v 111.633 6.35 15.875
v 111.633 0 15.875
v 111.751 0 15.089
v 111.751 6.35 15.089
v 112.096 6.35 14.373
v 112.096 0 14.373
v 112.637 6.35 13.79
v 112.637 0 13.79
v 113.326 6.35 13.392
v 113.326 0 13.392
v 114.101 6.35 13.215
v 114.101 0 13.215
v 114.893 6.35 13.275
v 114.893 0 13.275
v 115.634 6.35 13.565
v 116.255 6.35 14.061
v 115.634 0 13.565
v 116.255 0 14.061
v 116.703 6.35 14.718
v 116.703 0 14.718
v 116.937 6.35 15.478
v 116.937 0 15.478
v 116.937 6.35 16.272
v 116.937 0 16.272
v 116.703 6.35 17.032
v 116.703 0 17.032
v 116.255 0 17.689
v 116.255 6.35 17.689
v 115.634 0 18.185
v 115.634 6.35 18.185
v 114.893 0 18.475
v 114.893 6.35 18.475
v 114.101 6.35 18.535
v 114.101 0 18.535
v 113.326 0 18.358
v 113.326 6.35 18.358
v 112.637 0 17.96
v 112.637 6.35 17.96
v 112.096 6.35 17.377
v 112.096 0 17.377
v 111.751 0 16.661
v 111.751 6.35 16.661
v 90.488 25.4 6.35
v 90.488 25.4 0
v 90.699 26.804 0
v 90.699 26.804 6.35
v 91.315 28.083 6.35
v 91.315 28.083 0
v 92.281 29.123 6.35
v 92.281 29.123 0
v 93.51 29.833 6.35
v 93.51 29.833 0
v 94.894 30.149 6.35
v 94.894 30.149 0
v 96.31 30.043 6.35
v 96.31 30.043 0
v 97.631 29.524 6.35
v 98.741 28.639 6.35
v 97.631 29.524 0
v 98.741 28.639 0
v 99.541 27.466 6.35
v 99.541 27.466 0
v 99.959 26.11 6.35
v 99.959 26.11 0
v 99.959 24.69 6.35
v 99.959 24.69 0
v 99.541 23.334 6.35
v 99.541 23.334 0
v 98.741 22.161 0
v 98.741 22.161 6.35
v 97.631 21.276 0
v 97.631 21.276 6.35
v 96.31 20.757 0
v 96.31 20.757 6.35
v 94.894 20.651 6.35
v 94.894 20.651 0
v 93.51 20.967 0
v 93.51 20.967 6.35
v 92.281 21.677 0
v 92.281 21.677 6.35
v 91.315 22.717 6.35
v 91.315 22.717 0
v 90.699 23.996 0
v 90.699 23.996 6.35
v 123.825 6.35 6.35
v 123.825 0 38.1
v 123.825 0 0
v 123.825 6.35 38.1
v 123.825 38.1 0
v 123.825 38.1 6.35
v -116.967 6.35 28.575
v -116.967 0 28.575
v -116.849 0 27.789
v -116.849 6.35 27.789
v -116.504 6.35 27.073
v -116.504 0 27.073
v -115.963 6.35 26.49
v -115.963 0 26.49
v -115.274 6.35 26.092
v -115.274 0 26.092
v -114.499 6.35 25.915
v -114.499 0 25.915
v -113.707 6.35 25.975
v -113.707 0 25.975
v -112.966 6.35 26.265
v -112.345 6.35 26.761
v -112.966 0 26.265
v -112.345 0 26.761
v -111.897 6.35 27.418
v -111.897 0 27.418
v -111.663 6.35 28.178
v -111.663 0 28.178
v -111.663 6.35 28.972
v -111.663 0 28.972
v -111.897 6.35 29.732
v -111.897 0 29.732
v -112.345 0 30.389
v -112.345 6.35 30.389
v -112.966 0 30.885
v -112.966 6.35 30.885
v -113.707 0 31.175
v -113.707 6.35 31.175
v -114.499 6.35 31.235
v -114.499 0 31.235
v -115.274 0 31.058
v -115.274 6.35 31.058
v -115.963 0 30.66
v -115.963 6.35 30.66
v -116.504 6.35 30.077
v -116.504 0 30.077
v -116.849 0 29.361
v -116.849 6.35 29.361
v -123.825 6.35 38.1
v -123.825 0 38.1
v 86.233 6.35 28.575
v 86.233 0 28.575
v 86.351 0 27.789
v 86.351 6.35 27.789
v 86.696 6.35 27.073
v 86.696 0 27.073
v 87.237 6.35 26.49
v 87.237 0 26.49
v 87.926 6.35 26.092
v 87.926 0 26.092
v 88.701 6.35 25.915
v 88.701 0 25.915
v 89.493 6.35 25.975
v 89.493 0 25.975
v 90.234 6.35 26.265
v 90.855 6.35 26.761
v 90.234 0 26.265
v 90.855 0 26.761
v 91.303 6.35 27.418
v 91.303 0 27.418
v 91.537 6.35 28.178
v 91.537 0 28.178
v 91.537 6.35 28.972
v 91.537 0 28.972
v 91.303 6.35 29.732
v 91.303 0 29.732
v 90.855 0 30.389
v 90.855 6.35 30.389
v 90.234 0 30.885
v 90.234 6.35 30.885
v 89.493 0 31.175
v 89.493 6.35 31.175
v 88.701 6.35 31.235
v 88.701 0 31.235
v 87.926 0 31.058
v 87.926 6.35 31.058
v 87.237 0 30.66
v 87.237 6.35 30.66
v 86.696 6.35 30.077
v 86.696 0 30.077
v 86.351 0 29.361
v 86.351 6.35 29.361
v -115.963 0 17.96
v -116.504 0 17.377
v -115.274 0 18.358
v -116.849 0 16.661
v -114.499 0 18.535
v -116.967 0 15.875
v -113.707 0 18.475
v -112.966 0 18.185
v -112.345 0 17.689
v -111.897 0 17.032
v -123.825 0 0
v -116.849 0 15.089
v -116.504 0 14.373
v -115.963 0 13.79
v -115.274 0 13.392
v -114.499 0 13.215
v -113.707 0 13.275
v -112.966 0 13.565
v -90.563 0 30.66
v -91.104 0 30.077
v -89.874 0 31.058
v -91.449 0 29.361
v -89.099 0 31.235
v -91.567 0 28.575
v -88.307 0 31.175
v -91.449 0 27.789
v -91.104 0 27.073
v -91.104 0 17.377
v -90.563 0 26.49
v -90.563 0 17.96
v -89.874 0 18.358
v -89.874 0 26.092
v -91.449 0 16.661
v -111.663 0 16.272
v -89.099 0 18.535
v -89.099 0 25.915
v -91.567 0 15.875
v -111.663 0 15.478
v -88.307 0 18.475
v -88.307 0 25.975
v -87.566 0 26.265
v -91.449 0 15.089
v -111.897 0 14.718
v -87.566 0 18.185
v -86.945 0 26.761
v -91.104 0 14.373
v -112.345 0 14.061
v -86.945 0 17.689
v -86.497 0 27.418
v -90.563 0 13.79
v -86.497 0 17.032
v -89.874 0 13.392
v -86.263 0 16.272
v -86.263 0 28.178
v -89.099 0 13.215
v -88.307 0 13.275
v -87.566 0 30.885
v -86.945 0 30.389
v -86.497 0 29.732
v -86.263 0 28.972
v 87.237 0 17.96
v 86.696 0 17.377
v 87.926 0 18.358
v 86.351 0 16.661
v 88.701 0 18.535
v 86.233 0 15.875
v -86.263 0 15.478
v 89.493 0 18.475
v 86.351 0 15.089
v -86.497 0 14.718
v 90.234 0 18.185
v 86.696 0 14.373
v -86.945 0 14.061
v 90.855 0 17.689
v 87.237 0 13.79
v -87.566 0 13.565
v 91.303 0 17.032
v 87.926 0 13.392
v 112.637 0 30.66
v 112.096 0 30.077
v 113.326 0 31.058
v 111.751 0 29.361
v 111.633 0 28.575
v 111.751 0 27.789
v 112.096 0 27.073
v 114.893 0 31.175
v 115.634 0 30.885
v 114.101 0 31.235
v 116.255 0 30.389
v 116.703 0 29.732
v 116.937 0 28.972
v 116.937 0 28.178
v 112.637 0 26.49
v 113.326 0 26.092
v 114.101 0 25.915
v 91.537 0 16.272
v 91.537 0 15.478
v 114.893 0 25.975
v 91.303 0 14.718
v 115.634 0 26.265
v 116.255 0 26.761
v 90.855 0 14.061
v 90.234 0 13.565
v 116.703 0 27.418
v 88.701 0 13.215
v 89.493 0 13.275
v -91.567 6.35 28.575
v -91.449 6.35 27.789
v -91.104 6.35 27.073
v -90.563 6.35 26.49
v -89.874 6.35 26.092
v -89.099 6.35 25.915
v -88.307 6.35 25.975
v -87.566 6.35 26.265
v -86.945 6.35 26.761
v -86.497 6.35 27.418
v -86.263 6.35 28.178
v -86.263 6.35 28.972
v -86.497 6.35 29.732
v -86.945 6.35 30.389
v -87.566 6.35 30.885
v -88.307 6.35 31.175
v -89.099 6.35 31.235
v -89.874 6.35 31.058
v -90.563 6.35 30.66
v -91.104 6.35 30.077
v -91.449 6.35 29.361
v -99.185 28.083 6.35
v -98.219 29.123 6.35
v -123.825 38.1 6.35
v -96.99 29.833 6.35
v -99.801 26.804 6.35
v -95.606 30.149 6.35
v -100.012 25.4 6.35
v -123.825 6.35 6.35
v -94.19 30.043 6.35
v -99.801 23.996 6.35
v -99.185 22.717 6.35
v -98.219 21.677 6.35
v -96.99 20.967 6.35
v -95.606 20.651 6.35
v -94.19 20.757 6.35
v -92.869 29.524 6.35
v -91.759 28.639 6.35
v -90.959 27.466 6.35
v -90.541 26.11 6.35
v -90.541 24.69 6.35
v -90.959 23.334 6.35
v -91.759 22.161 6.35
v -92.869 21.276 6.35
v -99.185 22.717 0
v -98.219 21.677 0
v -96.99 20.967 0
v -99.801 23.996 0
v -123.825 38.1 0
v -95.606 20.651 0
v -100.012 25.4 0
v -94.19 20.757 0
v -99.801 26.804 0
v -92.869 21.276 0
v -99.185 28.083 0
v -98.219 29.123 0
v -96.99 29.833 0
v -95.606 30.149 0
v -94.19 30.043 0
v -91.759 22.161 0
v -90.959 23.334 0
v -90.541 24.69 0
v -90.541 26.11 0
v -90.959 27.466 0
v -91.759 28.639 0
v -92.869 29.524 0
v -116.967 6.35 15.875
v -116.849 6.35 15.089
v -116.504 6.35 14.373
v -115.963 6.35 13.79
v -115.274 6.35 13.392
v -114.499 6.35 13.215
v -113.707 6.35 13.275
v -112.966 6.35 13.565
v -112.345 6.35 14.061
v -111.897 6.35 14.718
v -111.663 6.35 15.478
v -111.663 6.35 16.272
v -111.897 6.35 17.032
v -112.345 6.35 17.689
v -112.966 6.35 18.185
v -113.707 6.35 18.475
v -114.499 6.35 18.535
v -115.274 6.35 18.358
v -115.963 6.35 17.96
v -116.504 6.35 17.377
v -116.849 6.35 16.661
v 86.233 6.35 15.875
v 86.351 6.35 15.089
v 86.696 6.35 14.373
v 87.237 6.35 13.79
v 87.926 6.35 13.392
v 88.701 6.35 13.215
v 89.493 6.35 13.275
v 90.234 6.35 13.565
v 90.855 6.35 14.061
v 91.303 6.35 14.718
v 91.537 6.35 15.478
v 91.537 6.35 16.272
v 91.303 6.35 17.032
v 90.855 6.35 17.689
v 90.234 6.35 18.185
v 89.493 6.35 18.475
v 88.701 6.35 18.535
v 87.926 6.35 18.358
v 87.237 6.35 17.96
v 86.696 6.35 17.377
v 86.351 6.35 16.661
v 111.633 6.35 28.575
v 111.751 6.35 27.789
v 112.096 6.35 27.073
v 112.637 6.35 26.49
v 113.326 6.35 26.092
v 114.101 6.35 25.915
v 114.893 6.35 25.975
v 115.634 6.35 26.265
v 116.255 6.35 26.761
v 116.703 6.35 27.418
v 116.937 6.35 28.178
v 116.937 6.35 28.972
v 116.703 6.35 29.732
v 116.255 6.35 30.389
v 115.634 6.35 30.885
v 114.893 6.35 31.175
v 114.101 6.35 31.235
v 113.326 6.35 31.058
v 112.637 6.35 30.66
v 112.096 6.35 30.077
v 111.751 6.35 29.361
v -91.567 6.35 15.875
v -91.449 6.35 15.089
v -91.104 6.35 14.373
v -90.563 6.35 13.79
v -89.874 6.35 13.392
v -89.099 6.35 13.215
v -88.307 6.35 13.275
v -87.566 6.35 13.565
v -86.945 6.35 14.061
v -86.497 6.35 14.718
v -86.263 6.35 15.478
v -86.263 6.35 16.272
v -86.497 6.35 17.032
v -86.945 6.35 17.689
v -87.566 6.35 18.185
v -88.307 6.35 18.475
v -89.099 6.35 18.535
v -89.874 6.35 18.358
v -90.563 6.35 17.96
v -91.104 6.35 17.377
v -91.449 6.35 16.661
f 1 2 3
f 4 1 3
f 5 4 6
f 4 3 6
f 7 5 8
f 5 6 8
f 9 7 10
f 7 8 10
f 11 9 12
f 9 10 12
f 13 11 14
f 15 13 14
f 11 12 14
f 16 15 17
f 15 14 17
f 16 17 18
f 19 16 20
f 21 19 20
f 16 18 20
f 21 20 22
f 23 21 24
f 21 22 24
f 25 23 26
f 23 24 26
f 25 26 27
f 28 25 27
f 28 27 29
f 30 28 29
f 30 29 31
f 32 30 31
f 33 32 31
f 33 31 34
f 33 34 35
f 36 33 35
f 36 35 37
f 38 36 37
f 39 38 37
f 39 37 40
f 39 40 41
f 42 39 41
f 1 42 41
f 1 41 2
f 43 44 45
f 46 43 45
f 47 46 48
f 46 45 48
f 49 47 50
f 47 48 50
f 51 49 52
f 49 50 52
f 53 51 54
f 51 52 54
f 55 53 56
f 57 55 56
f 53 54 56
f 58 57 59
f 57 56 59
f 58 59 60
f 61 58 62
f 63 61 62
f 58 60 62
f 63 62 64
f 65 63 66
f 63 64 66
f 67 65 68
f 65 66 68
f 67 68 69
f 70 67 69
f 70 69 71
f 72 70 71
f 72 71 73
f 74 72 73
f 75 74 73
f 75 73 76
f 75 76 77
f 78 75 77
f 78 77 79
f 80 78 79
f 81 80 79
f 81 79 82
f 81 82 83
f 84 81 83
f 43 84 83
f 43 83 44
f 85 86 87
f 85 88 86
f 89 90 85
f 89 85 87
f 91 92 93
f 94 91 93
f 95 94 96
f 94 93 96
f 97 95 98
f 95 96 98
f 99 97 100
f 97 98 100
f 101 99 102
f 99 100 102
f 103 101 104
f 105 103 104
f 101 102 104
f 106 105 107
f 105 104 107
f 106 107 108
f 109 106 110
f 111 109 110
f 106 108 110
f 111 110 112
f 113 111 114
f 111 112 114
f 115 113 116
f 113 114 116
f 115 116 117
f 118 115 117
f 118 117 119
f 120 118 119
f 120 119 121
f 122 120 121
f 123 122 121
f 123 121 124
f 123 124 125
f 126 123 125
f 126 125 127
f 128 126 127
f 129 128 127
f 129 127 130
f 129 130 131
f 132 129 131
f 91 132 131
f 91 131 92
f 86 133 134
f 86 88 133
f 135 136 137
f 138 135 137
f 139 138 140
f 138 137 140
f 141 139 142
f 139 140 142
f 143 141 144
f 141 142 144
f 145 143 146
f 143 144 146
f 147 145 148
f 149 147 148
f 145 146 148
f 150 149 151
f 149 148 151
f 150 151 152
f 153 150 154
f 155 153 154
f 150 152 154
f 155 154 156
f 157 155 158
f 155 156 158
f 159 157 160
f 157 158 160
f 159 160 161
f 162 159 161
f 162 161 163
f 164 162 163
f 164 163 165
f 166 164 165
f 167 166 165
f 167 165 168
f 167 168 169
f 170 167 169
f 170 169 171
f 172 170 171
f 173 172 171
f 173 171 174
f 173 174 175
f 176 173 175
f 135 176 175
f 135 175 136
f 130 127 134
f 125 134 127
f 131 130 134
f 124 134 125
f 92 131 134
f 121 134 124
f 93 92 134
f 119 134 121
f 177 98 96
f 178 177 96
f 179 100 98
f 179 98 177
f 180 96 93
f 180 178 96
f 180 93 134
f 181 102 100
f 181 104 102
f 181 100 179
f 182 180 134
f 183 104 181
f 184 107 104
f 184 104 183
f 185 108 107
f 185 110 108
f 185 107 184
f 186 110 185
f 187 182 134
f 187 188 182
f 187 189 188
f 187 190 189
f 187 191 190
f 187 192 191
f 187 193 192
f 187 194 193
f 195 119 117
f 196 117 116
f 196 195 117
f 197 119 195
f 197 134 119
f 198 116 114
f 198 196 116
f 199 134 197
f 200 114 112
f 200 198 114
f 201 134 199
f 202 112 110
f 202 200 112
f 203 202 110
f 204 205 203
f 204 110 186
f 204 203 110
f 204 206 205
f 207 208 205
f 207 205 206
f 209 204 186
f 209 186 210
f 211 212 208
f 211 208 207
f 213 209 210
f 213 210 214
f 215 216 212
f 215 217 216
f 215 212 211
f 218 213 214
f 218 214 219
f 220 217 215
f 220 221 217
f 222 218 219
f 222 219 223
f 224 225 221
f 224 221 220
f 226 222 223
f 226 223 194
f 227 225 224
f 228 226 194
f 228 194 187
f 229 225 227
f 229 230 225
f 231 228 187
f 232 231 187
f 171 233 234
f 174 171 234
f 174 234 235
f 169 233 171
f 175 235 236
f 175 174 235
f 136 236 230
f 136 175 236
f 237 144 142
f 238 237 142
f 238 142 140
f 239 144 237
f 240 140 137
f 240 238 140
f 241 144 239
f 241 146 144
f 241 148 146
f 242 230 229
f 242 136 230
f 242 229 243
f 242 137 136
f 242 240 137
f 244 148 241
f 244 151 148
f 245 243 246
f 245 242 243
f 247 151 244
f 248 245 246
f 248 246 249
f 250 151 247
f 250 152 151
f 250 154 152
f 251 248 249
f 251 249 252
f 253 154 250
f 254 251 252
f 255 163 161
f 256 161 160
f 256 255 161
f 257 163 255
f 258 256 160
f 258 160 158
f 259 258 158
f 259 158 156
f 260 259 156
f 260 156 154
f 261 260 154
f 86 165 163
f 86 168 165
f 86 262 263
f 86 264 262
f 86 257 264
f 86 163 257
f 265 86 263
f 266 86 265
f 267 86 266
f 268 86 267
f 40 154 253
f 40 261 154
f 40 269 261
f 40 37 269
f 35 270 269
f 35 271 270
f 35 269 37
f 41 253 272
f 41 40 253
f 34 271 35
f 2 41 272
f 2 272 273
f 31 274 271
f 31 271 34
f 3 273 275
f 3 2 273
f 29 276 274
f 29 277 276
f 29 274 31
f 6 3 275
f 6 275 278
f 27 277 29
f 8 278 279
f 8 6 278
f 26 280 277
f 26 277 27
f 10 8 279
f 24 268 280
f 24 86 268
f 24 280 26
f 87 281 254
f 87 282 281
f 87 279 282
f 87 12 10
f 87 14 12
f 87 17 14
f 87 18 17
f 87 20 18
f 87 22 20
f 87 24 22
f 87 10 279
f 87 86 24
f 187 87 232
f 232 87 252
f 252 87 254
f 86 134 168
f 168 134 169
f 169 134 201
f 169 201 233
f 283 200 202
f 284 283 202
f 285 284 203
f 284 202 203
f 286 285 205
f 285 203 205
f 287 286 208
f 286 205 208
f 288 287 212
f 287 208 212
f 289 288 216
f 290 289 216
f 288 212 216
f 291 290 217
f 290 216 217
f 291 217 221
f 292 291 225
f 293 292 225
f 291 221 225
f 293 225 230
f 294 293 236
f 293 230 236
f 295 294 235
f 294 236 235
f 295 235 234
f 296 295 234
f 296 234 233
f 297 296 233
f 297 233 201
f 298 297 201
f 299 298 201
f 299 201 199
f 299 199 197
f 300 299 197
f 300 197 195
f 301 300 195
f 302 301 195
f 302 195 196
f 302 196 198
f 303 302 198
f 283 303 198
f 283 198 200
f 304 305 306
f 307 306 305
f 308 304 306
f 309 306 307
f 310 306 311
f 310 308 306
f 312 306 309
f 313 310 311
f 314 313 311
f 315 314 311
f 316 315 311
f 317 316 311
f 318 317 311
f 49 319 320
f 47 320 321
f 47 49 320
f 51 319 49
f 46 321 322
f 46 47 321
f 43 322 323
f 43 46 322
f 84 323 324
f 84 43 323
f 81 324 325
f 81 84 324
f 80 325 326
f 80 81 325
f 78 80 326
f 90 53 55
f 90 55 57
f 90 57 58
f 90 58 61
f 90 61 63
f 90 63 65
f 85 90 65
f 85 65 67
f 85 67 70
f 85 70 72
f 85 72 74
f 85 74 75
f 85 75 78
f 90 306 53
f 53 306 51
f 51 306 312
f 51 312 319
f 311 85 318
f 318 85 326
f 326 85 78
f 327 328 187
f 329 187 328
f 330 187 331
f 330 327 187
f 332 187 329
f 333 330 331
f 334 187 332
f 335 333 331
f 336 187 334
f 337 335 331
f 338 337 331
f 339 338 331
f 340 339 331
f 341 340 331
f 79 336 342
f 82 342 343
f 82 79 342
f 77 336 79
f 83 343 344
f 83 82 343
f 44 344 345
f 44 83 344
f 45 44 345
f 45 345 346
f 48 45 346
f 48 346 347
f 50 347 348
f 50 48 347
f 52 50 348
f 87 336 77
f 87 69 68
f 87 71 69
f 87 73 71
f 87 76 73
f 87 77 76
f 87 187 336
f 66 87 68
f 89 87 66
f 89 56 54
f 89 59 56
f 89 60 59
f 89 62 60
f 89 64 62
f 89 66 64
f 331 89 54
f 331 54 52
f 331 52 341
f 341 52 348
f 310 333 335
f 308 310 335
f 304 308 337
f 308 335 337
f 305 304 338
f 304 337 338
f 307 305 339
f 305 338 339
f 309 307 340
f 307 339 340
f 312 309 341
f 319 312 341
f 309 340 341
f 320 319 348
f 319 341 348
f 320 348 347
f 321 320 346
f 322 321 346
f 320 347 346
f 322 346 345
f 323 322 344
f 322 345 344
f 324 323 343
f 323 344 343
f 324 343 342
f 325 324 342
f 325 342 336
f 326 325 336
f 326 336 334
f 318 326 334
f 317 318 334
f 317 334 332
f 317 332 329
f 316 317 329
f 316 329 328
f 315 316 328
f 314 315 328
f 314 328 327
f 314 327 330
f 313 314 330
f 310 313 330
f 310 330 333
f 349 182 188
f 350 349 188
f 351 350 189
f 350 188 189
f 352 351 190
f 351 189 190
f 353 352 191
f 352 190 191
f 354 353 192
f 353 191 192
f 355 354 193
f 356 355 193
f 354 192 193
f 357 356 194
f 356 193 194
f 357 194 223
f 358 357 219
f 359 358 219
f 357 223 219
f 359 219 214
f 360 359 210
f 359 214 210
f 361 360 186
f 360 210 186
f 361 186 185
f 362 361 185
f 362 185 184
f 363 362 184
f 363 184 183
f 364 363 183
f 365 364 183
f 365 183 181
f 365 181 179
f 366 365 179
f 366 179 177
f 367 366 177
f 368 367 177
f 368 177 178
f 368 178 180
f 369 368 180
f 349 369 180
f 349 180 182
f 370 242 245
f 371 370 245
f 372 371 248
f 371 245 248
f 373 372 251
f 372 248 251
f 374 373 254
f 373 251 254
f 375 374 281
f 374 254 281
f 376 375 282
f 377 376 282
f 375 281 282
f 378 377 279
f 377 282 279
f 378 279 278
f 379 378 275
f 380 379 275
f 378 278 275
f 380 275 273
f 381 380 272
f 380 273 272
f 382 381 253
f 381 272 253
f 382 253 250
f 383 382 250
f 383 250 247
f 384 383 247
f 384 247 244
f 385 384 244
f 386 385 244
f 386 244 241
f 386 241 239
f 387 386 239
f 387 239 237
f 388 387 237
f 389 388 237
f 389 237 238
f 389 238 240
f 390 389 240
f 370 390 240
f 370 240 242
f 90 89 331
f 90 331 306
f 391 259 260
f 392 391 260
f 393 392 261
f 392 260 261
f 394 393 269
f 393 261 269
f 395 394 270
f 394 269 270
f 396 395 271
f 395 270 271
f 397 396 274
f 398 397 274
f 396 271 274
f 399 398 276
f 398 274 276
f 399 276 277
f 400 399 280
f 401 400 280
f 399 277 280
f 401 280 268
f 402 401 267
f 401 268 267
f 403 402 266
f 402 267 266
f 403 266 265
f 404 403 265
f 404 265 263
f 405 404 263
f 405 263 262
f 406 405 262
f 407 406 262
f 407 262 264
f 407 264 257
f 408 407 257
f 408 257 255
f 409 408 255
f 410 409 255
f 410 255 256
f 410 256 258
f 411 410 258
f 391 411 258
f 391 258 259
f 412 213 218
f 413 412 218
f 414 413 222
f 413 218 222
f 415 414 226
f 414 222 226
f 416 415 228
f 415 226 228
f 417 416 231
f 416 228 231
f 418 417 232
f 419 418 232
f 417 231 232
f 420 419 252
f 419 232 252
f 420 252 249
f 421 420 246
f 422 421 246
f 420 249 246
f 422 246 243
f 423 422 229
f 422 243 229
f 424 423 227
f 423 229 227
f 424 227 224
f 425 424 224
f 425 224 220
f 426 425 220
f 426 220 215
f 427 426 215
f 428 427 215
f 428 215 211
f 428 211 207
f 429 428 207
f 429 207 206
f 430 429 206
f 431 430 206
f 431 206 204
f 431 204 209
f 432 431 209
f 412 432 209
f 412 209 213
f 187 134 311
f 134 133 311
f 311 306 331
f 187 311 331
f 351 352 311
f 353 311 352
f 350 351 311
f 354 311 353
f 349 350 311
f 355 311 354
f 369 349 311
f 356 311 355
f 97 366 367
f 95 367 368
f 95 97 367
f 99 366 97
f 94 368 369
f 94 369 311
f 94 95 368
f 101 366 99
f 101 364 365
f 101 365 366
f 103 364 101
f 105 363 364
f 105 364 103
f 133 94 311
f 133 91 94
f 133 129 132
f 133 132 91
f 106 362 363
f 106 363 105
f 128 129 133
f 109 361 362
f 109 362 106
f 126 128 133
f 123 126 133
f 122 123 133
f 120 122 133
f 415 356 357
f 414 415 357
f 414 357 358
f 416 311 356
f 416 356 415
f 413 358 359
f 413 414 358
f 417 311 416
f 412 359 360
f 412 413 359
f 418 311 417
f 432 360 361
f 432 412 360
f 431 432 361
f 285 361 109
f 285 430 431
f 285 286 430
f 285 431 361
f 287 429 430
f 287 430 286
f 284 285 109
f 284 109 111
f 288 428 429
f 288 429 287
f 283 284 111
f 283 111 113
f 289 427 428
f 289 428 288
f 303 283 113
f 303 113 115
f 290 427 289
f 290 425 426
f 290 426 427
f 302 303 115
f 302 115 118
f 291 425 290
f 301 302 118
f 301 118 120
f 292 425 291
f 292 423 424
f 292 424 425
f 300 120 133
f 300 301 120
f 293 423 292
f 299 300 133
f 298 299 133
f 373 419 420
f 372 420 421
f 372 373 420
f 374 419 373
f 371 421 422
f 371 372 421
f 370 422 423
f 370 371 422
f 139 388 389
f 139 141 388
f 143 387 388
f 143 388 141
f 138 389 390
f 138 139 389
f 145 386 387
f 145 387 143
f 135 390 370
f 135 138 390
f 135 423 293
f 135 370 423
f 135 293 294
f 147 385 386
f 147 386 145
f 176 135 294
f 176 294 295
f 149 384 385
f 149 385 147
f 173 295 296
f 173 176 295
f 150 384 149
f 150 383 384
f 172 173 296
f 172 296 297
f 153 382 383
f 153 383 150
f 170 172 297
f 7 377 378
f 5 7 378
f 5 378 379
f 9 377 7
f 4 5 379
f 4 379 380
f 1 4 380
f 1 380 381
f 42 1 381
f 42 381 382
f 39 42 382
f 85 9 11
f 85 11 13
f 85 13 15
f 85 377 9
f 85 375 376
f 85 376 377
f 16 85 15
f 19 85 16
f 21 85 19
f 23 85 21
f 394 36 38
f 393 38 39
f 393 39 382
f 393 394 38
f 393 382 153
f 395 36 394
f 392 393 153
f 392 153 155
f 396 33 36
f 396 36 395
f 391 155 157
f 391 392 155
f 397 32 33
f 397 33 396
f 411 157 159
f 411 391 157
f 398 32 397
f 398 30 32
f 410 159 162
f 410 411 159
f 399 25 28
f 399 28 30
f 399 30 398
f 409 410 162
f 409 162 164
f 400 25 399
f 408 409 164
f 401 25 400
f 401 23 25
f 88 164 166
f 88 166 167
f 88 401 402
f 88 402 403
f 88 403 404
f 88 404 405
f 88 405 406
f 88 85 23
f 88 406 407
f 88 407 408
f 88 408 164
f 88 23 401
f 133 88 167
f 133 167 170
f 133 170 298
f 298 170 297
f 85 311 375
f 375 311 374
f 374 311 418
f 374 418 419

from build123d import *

# Parameters (mm, degrees)
EXTRUDE_THIN1_DEPTH          = 123.825
F_10_CLEARANCE_HOLE1_D       = 5.334
F_3_8_0_375_DIAMETER_HOLE1_D = 9.525


with BuildPart() as part:
    # Sketch1 → Extrude-Thin1 (new, symmetric)
    with BuildSketch(Plane(origin=(0, 0, 0), x_dir=(0, 0, -1), z_dir=(1, 0, 0))):
        Polygon((-38.1, 0), (0, 0), (0, 38.1), (-6.35, 38.1), (-6.35, 6.35), (-38.1, 6.35), align=None)
    extrude(amount=EXTRUDE_THIN1_DEPTH, both=True)

    # #10 Clearance Hole1 (through all)
    with Locations(Plane(origin=(0, 6.35, 0), x_dir=(1, 0, 0), z_dir=(0, 1, 0))):
        with Locations((-114.3, -15.875), (-114.3, -28.575), (-88.9, -28.575), (-88.9, -15.875), (88.9, -15.875), (88.9, -28.575), (114.3, -28.575), (114.3, -15.875)):
            Hole(F_10_CLEARANCE_HOLE1_D / 2)

    # 3/8 (0.375) Diameter Hole1 (through all)
    with Locations(Plane.XY.offset(6.35)):
        with Locations((-95.25, 25.4), (95.25, 25.4)):
            Hole(F_3_8_0_375_DIAMETER_HOLE1_D / 2)


solid = part.part
